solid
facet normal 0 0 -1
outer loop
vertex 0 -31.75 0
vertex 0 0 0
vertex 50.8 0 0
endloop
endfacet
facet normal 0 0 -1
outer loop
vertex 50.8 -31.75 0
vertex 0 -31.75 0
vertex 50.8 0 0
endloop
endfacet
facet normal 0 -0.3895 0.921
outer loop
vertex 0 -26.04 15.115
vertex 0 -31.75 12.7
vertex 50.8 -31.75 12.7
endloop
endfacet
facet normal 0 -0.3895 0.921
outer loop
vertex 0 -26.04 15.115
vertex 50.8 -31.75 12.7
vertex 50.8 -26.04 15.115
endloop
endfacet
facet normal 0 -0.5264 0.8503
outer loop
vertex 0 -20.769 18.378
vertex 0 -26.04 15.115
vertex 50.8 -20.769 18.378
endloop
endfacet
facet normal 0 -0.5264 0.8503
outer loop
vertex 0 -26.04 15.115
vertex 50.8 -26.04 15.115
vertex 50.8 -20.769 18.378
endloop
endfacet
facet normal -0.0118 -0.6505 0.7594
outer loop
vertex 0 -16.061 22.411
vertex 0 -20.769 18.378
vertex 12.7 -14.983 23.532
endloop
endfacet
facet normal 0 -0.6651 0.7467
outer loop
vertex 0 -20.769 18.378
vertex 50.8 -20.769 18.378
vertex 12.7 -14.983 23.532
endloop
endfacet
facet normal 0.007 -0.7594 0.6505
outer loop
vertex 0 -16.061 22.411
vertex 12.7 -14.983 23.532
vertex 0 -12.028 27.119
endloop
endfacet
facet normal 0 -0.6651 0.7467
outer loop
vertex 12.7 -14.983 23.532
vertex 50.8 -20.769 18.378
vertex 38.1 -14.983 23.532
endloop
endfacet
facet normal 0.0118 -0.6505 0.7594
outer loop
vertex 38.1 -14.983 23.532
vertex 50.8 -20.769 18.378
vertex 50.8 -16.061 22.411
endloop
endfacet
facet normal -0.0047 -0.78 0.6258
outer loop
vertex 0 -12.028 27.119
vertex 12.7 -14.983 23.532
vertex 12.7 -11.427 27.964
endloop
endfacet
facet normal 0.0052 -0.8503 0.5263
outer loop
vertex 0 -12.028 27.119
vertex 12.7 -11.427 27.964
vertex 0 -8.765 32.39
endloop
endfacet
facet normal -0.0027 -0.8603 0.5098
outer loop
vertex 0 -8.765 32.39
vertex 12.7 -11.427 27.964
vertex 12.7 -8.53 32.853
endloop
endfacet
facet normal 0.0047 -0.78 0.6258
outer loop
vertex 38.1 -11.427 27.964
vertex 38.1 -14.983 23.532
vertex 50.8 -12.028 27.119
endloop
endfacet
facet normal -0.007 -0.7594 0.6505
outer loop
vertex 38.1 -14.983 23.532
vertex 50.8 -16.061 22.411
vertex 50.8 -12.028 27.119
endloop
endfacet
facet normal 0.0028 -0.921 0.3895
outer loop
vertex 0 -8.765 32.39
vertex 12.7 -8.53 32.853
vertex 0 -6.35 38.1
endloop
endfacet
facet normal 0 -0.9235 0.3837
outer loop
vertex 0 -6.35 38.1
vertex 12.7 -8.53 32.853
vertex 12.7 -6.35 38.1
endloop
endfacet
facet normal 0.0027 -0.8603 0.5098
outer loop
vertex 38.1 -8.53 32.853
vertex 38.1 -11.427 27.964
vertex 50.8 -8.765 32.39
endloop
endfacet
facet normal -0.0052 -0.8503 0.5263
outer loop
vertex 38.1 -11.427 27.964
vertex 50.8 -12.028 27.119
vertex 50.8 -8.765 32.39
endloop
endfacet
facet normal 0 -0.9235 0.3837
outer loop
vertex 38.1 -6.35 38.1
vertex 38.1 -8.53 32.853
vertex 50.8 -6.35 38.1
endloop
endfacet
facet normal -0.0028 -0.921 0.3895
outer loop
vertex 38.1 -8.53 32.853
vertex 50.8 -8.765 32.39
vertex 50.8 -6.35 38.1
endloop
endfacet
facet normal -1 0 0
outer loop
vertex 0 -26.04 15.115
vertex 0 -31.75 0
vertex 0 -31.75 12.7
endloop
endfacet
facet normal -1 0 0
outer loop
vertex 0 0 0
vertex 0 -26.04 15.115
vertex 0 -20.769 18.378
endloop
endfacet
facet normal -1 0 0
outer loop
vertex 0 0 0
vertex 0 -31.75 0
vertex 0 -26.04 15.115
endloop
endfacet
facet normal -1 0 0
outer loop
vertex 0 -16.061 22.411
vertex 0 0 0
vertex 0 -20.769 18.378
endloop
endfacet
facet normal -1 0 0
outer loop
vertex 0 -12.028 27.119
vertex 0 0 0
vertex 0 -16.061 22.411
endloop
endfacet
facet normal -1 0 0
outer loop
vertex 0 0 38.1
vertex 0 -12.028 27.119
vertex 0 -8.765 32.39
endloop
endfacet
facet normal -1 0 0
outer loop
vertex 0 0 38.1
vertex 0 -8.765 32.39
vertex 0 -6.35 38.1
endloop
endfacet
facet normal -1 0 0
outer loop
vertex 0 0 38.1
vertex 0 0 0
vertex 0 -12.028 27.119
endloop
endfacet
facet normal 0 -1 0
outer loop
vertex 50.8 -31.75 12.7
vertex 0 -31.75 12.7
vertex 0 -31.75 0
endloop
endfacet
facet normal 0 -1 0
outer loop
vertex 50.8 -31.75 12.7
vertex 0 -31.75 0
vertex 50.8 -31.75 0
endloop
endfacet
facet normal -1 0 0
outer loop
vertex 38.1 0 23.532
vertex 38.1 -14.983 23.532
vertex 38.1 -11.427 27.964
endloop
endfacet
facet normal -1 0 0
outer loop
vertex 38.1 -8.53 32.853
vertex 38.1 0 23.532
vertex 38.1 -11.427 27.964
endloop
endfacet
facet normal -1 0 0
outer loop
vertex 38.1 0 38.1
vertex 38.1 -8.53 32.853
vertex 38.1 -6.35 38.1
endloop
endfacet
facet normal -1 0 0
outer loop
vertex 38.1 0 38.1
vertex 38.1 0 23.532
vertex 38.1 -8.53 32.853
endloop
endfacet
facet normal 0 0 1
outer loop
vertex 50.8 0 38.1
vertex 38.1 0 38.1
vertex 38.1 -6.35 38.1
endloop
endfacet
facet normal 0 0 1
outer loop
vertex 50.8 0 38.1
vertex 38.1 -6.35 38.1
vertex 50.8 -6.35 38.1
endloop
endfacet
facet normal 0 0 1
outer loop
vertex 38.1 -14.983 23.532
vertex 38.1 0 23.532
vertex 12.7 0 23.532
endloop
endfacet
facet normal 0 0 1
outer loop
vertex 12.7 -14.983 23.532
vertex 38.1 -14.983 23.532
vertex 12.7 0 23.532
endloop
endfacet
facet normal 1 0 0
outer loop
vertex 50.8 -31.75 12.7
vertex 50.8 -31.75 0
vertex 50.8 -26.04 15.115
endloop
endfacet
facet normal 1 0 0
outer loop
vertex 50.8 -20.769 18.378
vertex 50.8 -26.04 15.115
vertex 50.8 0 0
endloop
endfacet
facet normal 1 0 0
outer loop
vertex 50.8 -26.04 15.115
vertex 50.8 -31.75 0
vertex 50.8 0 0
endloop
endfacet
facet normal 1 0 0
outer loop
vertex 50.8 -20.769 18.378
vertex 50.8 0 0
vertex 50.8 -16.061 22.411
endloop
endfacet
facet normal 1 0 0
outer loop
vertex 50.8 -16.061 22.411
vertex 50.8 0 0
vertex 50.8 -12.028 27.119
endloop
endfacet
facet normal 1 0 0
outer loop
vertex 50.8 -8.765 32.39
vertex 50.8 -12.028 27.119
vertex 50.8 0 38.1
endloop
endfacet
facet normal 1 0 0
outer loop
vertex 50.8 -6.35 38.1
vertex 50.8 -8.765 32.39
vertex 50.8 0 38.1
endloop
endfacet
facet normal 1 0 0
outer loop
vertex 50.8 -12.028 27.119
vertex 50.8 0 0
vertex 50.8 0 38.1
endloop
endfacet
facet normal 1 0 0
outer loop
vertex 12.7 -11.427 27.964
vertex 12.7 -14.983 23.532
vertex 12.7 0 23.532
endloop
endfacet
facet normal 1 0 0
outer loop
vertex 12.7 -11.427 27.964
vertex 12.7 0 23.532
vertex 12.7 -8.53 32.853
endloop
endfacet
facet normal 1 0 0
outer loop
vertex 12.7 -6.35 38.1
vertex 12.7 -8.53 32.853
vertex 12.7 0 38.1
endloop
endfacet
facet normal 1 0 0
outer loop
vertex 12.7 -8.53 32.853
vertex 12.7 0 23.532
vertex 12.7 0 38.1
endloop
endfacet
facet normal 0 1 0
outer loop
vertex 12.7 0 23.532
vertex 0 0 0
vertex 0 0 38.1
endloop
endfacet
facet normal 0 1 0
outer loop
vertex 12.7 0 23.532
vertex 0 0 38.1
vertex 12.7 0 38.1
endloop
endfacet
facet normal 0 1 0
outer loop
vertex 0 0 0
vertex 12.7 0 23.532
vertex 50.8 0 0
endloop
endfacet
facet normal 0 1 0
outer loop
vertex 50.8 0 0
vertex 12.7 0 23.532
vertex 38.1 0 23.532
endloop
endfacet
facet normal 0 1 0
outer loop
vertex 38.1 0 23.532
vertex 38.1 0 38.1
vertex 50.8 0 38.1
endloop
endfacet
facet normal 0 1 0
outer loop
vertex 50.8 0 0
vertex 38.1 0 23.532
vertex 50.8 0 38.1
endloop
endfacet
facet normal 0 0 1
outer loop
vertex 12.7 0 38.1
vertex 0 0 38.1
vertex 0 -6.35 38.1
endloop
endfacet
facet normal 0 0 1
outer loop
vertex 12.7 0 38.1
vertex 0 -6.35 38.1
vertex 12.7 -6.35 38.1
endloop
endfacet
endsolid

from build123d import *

# Parameters (mm, degrees)
F0_W     = 50.8
F0_H     = 38.1
F1_DEPTH = 31.75
F3_DEPTH = 50.8
F4_W     = 25.4
F4_H     = 14.567647
F5_DEPTH = 25.4


with BuildPart() as f1:
    # F0 (on Front) → F1 (new body)
    with BuildSketch(Plane.XZ):
        with Locations((25.4, 19.05)):
            Rectangle(F0_W, F0_H)
    extrude(amount=F1_DEPTH)

    # F2 (on face) → F3 (cut)
    with BuildSketch(Plane.YZ.offset(50.8)):
        with BuildLine():
            Line((-31.75, 38.1), (-31.75, 12.7))
            ThreePointArc((-31.75, 12.7), (-16.061294, 22.411294), (-6.35, 38.1))
            Line((-6.35, 38.1), (-31.75, 38.1))
        make_face()
    extrude(amount=-F3_DEPTH, mode=Mode.SUBTRACT)

    # F4 (on face) → F5 (cut)
    with BuildSketch(Plane(origin=(0, 0, 0), x_dir=(-1, 0, 0), z_dir=(0, 1, 0))):
        with Locations((-25.4, 30.816177)):
            Rectangle(F4_W, F4_H)
    extrude(amount=-F5_DEPTH, mode=Mode.SUBTRACT)


solid = f1.part
